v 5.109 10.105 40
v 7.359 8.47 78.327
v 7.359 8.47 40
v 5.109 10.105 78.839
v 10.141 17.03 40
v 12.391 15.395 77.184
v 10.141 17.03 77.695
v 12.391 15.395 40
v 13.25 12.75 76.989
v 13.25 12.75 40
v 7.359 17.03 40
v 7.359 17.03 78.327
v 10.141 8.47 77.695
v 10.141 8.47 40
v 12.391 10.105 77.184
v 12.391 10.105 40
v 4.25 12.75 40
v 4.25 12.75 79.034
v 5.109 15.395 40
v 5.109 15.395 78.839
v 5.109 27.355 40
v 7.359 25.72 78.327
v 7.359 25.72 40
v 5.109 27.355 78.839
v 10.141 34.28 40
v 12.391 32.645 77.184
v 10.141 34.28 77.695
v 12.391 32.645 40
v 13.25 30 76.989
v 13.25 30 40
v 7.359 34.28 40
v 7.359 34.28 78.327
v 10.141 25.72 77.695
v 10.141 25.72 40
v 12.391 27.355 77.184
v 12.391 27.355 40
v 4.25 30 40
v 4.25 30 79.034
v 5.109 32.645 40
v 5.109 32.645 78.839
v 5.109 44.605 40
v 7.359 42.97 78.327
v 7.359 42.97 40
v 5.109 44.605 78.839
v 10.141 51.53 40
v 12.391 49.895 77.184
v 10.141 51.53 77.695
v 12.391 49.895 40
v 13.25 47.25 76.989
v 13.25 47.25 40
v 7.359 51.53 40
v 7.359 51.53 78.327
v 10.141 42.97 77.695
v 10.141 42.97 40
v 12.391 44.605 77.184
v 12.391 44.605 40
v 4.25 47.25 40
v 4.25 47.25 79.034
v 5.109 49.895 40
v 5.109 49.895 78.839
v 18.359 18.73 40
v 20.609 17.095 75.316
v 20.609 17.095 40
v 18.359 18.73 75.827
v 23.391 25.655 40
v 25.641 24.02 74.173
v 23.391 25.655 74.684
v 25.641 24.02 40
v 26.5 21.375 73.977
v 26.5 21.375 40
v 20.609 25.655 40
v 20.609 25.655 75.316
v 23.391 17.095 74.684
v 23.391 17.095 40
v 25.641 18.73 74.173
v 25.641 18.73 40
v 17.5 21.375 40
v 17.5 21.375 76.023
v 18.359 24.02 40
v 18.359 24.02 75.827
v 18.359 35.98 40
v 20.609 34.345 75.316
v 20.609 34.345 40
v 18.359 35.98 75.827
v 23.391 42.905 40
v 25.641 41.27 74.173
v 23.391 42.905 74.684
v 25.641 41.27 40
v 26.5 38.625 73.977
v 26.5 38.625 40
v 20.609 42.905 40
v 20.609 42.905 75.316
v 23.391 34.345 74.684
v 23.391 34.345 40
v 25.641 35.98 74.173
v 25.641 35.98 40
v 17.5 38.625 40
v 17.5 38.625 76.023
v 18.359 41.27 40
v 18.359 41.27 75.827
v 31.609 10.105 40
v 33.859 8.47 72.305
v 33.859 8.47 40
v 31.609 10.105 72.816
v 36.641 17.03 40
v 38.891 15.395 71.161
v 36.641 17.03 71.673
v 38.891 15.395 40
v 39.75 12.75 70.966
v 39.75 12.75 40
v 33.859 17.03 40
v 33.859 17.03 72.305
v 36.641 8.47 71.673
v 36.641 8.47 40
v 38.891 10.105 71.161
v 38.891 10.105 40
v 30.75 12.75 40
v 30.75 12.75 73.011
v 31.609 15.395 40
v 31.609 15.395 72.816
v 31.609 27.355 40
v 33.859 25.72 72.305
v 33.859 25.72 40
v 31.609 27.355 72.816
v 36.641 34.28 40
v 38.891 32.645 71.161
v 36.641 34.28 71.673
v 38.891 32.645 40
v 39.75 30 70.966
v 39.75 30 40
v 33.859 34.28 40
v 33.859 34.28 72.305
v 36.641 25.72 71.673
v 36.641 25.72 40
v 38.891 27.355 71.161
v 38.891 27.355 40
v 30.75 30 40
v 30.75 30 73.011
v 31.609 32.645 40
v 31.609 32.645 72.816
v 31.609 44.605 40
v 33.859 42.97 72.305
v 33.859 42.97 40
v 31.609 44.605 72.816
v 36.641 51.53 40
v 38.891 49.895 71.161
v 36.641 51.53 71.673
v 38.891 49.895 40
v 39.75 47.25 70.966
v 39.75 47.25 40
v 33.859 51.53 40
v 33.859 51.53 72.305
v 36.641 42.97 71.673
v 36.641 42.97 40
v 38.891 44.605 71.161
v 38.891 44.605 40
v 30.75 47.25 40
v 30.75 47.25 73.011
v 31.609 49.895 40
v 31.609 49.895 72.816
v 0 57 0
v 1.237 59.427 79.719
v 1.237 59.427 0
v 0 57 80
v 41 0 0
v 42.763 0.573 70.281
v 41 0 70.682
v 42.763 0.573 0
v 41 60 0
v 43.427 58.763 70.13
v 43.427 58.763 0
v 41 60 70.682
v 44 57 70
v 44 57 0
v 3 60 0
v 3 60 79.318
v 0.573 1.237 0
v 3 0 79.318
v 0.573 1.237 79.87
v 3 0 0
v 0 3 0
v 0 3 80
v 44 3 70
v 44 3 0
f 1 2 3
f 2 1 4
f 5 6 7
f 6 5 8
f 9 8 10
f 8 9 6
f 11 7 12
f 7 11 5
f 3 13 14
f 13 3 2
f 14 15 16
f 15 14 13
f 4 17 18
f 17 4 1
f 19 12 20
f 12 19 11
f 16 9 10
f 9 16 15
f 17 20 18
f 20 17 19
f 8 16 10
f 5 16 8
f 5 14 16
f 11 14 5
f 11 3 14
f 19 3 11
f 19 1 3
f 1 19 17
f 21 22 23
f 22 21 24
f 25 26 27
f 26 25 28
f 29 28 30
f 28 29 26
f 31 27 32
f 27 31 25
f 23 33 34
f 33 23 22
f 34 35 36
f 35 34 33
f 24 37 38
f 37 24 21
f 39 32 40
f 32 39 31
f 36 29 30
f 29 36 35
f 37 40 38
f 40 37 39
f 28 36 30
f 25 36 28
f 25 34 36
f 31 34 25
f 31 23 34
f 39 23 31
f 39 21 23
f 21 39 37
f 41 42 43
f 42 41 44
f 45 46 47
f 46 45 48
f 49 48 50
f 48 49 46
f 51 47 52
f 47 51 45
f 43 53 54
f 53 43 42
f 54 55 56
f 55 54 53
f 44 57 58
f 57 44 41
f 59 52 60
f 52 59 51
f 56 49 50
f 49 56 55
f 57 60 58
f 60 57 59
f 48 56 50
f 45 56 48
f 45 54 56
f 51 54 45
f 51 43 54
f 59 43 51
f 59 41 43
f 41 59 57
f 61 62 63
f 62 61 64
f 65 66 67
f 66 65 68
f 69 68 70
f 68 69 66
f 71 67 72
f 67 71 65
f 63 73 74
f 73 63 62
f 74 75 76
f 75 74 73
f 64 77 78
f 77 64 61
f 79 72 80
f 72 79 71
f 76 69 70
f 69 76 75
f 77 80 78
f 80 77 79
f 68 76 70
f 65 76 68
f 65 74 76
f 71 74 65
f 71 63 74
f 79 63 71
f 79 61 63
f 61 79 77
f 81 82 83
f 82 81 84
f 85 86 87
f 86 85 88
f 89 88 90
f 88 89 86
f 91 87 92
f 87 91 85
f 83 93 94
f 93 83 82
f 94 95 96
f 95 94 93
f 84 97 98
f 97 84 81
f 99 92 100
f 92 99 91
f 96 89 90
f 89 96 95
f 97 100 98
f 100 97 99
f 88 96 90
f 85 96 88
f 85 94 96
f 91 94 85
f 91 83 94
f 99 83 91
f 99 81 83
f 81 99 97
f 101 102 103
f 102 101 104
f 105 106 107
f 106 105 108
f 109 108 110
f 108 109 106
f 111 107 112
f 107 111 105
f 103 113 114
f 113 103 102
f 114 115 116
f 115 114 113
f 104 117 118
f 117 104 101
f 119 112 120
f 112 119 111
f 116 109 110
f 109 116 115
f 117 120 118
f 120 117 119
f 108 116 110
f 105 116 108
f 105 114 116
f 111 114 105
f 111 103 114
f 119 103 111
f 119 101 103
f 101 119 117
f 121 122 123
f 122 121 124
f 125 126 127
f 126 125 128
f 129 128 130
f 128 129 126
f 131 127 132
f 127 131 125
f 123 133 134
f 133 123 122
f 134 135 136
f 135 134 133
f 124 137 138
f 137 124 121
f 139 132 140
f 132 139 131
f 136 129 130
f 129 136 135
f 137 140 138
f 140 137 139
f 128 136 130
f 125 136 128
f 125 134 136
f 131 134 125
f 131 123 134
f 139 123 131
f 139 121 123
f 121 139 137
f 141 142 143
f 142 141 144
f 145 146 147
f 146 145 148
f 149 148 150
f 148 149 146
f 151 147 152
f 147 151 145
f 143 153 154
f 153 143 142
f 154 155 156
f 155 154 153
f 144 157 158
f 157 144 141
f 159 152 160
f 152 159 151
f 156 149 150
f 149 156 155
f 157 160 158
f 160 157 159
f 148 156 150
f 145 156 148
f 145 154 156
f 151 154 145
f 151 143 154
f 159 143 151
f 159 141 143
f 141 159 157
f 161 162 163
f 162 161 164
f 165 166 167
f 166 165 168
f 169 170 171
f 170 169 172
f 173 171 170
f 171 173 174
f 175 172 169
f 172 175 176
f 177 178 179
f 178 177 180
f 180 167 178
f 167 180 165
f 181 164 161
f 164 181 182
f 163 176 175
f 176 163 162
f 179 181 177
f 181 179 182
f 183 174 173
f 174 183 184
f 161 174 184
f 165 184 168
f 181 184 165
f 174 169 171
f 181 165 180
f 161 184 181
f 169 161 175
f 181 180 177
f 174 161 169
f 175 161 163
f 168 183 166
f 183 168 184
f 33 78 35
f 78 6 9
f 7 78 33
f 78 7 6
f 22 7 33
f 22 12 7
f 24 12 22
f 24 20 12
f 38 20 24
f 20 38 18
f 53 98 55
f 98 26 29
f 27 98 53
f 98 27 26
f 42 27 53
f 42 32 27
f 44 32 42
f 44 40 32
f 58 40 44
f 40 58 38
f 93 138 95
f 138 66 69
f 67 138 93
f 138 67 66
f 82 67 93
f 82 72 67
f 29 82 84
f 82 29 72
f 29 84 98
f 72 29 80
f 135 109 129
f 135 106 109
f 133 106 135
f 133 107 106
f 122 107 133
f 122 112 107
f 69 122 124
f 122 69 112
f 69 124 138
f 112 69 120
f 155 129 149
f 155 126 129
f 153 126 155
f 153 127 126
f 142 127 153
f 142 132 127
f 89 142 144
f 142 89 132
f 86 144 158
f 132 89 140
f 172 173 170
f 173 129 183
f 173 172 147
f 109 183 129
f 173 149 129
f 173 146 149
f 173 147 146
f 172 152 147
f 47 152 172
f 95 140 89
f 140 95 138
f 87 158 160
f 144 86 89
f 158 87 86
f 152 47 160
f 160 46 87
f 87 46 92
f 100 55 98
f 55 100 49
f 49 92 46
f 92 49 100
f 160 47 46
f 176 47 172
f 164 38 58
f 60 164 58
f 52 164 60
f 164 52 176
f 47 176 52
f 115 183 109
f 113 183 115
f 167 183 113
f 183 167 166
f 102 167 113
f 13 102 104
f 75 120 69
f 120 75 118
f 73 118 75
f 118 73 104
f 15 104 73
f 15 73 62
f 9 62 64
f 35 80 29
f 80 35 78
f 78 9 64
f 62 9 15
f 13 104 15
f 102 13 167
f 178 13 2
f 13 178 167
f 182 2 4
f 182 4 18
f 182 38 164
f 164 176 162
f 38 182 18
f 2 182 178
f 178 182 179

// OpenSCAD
base_x = 44;
base_y = 60;

z_min = 70;
z_max = 80;

radio = 3;

cant_x = 3;
cant_y = 3;

profundidad = z_max/2;
diametro = 9;

dist_agujero_x = (base_x - diametro * cant_x)/(cant_x+1) + diametro;

dist_agujero_y = (base_y - diametro * cant_y) / (cant_y+1) + diametro;


//minkowski()
//{
//    translate ([0,0,0]) cylinder(h = z_min ,d = 3);
    
difference()
{

    //cube([base_x,base_y,z_max]);
    translate([radio,radio,0]){
        linear_extrude(height = z_max) {
            offset(r=radio, $fn=10) {
                square([base_x-2*radio,base_y-2*radio]);
            }
        }
    }
    translate ([0,0,z_max]) rotate (a = [-90,0,0]) linear_extrude(height = base_y) polygon(points=[[0,0],[base_x,0],[base_x,z_max-z_min]]);




for(i = [0:1:cant_x-1] )
{

    for(j = [0:1:cant_y-1-1*(i%2)]){
        translate ([dist_agujero_x*i+dist_agujero_x-diametro/2,dist_agujero_y*j+dist_agujero_y-diametro/2+(i%2)*dist_agujero_y/2,z_max-profundidad]) cylinder(h = profundidad, d = diametro, $fn=10);
    }
}

}
//}
